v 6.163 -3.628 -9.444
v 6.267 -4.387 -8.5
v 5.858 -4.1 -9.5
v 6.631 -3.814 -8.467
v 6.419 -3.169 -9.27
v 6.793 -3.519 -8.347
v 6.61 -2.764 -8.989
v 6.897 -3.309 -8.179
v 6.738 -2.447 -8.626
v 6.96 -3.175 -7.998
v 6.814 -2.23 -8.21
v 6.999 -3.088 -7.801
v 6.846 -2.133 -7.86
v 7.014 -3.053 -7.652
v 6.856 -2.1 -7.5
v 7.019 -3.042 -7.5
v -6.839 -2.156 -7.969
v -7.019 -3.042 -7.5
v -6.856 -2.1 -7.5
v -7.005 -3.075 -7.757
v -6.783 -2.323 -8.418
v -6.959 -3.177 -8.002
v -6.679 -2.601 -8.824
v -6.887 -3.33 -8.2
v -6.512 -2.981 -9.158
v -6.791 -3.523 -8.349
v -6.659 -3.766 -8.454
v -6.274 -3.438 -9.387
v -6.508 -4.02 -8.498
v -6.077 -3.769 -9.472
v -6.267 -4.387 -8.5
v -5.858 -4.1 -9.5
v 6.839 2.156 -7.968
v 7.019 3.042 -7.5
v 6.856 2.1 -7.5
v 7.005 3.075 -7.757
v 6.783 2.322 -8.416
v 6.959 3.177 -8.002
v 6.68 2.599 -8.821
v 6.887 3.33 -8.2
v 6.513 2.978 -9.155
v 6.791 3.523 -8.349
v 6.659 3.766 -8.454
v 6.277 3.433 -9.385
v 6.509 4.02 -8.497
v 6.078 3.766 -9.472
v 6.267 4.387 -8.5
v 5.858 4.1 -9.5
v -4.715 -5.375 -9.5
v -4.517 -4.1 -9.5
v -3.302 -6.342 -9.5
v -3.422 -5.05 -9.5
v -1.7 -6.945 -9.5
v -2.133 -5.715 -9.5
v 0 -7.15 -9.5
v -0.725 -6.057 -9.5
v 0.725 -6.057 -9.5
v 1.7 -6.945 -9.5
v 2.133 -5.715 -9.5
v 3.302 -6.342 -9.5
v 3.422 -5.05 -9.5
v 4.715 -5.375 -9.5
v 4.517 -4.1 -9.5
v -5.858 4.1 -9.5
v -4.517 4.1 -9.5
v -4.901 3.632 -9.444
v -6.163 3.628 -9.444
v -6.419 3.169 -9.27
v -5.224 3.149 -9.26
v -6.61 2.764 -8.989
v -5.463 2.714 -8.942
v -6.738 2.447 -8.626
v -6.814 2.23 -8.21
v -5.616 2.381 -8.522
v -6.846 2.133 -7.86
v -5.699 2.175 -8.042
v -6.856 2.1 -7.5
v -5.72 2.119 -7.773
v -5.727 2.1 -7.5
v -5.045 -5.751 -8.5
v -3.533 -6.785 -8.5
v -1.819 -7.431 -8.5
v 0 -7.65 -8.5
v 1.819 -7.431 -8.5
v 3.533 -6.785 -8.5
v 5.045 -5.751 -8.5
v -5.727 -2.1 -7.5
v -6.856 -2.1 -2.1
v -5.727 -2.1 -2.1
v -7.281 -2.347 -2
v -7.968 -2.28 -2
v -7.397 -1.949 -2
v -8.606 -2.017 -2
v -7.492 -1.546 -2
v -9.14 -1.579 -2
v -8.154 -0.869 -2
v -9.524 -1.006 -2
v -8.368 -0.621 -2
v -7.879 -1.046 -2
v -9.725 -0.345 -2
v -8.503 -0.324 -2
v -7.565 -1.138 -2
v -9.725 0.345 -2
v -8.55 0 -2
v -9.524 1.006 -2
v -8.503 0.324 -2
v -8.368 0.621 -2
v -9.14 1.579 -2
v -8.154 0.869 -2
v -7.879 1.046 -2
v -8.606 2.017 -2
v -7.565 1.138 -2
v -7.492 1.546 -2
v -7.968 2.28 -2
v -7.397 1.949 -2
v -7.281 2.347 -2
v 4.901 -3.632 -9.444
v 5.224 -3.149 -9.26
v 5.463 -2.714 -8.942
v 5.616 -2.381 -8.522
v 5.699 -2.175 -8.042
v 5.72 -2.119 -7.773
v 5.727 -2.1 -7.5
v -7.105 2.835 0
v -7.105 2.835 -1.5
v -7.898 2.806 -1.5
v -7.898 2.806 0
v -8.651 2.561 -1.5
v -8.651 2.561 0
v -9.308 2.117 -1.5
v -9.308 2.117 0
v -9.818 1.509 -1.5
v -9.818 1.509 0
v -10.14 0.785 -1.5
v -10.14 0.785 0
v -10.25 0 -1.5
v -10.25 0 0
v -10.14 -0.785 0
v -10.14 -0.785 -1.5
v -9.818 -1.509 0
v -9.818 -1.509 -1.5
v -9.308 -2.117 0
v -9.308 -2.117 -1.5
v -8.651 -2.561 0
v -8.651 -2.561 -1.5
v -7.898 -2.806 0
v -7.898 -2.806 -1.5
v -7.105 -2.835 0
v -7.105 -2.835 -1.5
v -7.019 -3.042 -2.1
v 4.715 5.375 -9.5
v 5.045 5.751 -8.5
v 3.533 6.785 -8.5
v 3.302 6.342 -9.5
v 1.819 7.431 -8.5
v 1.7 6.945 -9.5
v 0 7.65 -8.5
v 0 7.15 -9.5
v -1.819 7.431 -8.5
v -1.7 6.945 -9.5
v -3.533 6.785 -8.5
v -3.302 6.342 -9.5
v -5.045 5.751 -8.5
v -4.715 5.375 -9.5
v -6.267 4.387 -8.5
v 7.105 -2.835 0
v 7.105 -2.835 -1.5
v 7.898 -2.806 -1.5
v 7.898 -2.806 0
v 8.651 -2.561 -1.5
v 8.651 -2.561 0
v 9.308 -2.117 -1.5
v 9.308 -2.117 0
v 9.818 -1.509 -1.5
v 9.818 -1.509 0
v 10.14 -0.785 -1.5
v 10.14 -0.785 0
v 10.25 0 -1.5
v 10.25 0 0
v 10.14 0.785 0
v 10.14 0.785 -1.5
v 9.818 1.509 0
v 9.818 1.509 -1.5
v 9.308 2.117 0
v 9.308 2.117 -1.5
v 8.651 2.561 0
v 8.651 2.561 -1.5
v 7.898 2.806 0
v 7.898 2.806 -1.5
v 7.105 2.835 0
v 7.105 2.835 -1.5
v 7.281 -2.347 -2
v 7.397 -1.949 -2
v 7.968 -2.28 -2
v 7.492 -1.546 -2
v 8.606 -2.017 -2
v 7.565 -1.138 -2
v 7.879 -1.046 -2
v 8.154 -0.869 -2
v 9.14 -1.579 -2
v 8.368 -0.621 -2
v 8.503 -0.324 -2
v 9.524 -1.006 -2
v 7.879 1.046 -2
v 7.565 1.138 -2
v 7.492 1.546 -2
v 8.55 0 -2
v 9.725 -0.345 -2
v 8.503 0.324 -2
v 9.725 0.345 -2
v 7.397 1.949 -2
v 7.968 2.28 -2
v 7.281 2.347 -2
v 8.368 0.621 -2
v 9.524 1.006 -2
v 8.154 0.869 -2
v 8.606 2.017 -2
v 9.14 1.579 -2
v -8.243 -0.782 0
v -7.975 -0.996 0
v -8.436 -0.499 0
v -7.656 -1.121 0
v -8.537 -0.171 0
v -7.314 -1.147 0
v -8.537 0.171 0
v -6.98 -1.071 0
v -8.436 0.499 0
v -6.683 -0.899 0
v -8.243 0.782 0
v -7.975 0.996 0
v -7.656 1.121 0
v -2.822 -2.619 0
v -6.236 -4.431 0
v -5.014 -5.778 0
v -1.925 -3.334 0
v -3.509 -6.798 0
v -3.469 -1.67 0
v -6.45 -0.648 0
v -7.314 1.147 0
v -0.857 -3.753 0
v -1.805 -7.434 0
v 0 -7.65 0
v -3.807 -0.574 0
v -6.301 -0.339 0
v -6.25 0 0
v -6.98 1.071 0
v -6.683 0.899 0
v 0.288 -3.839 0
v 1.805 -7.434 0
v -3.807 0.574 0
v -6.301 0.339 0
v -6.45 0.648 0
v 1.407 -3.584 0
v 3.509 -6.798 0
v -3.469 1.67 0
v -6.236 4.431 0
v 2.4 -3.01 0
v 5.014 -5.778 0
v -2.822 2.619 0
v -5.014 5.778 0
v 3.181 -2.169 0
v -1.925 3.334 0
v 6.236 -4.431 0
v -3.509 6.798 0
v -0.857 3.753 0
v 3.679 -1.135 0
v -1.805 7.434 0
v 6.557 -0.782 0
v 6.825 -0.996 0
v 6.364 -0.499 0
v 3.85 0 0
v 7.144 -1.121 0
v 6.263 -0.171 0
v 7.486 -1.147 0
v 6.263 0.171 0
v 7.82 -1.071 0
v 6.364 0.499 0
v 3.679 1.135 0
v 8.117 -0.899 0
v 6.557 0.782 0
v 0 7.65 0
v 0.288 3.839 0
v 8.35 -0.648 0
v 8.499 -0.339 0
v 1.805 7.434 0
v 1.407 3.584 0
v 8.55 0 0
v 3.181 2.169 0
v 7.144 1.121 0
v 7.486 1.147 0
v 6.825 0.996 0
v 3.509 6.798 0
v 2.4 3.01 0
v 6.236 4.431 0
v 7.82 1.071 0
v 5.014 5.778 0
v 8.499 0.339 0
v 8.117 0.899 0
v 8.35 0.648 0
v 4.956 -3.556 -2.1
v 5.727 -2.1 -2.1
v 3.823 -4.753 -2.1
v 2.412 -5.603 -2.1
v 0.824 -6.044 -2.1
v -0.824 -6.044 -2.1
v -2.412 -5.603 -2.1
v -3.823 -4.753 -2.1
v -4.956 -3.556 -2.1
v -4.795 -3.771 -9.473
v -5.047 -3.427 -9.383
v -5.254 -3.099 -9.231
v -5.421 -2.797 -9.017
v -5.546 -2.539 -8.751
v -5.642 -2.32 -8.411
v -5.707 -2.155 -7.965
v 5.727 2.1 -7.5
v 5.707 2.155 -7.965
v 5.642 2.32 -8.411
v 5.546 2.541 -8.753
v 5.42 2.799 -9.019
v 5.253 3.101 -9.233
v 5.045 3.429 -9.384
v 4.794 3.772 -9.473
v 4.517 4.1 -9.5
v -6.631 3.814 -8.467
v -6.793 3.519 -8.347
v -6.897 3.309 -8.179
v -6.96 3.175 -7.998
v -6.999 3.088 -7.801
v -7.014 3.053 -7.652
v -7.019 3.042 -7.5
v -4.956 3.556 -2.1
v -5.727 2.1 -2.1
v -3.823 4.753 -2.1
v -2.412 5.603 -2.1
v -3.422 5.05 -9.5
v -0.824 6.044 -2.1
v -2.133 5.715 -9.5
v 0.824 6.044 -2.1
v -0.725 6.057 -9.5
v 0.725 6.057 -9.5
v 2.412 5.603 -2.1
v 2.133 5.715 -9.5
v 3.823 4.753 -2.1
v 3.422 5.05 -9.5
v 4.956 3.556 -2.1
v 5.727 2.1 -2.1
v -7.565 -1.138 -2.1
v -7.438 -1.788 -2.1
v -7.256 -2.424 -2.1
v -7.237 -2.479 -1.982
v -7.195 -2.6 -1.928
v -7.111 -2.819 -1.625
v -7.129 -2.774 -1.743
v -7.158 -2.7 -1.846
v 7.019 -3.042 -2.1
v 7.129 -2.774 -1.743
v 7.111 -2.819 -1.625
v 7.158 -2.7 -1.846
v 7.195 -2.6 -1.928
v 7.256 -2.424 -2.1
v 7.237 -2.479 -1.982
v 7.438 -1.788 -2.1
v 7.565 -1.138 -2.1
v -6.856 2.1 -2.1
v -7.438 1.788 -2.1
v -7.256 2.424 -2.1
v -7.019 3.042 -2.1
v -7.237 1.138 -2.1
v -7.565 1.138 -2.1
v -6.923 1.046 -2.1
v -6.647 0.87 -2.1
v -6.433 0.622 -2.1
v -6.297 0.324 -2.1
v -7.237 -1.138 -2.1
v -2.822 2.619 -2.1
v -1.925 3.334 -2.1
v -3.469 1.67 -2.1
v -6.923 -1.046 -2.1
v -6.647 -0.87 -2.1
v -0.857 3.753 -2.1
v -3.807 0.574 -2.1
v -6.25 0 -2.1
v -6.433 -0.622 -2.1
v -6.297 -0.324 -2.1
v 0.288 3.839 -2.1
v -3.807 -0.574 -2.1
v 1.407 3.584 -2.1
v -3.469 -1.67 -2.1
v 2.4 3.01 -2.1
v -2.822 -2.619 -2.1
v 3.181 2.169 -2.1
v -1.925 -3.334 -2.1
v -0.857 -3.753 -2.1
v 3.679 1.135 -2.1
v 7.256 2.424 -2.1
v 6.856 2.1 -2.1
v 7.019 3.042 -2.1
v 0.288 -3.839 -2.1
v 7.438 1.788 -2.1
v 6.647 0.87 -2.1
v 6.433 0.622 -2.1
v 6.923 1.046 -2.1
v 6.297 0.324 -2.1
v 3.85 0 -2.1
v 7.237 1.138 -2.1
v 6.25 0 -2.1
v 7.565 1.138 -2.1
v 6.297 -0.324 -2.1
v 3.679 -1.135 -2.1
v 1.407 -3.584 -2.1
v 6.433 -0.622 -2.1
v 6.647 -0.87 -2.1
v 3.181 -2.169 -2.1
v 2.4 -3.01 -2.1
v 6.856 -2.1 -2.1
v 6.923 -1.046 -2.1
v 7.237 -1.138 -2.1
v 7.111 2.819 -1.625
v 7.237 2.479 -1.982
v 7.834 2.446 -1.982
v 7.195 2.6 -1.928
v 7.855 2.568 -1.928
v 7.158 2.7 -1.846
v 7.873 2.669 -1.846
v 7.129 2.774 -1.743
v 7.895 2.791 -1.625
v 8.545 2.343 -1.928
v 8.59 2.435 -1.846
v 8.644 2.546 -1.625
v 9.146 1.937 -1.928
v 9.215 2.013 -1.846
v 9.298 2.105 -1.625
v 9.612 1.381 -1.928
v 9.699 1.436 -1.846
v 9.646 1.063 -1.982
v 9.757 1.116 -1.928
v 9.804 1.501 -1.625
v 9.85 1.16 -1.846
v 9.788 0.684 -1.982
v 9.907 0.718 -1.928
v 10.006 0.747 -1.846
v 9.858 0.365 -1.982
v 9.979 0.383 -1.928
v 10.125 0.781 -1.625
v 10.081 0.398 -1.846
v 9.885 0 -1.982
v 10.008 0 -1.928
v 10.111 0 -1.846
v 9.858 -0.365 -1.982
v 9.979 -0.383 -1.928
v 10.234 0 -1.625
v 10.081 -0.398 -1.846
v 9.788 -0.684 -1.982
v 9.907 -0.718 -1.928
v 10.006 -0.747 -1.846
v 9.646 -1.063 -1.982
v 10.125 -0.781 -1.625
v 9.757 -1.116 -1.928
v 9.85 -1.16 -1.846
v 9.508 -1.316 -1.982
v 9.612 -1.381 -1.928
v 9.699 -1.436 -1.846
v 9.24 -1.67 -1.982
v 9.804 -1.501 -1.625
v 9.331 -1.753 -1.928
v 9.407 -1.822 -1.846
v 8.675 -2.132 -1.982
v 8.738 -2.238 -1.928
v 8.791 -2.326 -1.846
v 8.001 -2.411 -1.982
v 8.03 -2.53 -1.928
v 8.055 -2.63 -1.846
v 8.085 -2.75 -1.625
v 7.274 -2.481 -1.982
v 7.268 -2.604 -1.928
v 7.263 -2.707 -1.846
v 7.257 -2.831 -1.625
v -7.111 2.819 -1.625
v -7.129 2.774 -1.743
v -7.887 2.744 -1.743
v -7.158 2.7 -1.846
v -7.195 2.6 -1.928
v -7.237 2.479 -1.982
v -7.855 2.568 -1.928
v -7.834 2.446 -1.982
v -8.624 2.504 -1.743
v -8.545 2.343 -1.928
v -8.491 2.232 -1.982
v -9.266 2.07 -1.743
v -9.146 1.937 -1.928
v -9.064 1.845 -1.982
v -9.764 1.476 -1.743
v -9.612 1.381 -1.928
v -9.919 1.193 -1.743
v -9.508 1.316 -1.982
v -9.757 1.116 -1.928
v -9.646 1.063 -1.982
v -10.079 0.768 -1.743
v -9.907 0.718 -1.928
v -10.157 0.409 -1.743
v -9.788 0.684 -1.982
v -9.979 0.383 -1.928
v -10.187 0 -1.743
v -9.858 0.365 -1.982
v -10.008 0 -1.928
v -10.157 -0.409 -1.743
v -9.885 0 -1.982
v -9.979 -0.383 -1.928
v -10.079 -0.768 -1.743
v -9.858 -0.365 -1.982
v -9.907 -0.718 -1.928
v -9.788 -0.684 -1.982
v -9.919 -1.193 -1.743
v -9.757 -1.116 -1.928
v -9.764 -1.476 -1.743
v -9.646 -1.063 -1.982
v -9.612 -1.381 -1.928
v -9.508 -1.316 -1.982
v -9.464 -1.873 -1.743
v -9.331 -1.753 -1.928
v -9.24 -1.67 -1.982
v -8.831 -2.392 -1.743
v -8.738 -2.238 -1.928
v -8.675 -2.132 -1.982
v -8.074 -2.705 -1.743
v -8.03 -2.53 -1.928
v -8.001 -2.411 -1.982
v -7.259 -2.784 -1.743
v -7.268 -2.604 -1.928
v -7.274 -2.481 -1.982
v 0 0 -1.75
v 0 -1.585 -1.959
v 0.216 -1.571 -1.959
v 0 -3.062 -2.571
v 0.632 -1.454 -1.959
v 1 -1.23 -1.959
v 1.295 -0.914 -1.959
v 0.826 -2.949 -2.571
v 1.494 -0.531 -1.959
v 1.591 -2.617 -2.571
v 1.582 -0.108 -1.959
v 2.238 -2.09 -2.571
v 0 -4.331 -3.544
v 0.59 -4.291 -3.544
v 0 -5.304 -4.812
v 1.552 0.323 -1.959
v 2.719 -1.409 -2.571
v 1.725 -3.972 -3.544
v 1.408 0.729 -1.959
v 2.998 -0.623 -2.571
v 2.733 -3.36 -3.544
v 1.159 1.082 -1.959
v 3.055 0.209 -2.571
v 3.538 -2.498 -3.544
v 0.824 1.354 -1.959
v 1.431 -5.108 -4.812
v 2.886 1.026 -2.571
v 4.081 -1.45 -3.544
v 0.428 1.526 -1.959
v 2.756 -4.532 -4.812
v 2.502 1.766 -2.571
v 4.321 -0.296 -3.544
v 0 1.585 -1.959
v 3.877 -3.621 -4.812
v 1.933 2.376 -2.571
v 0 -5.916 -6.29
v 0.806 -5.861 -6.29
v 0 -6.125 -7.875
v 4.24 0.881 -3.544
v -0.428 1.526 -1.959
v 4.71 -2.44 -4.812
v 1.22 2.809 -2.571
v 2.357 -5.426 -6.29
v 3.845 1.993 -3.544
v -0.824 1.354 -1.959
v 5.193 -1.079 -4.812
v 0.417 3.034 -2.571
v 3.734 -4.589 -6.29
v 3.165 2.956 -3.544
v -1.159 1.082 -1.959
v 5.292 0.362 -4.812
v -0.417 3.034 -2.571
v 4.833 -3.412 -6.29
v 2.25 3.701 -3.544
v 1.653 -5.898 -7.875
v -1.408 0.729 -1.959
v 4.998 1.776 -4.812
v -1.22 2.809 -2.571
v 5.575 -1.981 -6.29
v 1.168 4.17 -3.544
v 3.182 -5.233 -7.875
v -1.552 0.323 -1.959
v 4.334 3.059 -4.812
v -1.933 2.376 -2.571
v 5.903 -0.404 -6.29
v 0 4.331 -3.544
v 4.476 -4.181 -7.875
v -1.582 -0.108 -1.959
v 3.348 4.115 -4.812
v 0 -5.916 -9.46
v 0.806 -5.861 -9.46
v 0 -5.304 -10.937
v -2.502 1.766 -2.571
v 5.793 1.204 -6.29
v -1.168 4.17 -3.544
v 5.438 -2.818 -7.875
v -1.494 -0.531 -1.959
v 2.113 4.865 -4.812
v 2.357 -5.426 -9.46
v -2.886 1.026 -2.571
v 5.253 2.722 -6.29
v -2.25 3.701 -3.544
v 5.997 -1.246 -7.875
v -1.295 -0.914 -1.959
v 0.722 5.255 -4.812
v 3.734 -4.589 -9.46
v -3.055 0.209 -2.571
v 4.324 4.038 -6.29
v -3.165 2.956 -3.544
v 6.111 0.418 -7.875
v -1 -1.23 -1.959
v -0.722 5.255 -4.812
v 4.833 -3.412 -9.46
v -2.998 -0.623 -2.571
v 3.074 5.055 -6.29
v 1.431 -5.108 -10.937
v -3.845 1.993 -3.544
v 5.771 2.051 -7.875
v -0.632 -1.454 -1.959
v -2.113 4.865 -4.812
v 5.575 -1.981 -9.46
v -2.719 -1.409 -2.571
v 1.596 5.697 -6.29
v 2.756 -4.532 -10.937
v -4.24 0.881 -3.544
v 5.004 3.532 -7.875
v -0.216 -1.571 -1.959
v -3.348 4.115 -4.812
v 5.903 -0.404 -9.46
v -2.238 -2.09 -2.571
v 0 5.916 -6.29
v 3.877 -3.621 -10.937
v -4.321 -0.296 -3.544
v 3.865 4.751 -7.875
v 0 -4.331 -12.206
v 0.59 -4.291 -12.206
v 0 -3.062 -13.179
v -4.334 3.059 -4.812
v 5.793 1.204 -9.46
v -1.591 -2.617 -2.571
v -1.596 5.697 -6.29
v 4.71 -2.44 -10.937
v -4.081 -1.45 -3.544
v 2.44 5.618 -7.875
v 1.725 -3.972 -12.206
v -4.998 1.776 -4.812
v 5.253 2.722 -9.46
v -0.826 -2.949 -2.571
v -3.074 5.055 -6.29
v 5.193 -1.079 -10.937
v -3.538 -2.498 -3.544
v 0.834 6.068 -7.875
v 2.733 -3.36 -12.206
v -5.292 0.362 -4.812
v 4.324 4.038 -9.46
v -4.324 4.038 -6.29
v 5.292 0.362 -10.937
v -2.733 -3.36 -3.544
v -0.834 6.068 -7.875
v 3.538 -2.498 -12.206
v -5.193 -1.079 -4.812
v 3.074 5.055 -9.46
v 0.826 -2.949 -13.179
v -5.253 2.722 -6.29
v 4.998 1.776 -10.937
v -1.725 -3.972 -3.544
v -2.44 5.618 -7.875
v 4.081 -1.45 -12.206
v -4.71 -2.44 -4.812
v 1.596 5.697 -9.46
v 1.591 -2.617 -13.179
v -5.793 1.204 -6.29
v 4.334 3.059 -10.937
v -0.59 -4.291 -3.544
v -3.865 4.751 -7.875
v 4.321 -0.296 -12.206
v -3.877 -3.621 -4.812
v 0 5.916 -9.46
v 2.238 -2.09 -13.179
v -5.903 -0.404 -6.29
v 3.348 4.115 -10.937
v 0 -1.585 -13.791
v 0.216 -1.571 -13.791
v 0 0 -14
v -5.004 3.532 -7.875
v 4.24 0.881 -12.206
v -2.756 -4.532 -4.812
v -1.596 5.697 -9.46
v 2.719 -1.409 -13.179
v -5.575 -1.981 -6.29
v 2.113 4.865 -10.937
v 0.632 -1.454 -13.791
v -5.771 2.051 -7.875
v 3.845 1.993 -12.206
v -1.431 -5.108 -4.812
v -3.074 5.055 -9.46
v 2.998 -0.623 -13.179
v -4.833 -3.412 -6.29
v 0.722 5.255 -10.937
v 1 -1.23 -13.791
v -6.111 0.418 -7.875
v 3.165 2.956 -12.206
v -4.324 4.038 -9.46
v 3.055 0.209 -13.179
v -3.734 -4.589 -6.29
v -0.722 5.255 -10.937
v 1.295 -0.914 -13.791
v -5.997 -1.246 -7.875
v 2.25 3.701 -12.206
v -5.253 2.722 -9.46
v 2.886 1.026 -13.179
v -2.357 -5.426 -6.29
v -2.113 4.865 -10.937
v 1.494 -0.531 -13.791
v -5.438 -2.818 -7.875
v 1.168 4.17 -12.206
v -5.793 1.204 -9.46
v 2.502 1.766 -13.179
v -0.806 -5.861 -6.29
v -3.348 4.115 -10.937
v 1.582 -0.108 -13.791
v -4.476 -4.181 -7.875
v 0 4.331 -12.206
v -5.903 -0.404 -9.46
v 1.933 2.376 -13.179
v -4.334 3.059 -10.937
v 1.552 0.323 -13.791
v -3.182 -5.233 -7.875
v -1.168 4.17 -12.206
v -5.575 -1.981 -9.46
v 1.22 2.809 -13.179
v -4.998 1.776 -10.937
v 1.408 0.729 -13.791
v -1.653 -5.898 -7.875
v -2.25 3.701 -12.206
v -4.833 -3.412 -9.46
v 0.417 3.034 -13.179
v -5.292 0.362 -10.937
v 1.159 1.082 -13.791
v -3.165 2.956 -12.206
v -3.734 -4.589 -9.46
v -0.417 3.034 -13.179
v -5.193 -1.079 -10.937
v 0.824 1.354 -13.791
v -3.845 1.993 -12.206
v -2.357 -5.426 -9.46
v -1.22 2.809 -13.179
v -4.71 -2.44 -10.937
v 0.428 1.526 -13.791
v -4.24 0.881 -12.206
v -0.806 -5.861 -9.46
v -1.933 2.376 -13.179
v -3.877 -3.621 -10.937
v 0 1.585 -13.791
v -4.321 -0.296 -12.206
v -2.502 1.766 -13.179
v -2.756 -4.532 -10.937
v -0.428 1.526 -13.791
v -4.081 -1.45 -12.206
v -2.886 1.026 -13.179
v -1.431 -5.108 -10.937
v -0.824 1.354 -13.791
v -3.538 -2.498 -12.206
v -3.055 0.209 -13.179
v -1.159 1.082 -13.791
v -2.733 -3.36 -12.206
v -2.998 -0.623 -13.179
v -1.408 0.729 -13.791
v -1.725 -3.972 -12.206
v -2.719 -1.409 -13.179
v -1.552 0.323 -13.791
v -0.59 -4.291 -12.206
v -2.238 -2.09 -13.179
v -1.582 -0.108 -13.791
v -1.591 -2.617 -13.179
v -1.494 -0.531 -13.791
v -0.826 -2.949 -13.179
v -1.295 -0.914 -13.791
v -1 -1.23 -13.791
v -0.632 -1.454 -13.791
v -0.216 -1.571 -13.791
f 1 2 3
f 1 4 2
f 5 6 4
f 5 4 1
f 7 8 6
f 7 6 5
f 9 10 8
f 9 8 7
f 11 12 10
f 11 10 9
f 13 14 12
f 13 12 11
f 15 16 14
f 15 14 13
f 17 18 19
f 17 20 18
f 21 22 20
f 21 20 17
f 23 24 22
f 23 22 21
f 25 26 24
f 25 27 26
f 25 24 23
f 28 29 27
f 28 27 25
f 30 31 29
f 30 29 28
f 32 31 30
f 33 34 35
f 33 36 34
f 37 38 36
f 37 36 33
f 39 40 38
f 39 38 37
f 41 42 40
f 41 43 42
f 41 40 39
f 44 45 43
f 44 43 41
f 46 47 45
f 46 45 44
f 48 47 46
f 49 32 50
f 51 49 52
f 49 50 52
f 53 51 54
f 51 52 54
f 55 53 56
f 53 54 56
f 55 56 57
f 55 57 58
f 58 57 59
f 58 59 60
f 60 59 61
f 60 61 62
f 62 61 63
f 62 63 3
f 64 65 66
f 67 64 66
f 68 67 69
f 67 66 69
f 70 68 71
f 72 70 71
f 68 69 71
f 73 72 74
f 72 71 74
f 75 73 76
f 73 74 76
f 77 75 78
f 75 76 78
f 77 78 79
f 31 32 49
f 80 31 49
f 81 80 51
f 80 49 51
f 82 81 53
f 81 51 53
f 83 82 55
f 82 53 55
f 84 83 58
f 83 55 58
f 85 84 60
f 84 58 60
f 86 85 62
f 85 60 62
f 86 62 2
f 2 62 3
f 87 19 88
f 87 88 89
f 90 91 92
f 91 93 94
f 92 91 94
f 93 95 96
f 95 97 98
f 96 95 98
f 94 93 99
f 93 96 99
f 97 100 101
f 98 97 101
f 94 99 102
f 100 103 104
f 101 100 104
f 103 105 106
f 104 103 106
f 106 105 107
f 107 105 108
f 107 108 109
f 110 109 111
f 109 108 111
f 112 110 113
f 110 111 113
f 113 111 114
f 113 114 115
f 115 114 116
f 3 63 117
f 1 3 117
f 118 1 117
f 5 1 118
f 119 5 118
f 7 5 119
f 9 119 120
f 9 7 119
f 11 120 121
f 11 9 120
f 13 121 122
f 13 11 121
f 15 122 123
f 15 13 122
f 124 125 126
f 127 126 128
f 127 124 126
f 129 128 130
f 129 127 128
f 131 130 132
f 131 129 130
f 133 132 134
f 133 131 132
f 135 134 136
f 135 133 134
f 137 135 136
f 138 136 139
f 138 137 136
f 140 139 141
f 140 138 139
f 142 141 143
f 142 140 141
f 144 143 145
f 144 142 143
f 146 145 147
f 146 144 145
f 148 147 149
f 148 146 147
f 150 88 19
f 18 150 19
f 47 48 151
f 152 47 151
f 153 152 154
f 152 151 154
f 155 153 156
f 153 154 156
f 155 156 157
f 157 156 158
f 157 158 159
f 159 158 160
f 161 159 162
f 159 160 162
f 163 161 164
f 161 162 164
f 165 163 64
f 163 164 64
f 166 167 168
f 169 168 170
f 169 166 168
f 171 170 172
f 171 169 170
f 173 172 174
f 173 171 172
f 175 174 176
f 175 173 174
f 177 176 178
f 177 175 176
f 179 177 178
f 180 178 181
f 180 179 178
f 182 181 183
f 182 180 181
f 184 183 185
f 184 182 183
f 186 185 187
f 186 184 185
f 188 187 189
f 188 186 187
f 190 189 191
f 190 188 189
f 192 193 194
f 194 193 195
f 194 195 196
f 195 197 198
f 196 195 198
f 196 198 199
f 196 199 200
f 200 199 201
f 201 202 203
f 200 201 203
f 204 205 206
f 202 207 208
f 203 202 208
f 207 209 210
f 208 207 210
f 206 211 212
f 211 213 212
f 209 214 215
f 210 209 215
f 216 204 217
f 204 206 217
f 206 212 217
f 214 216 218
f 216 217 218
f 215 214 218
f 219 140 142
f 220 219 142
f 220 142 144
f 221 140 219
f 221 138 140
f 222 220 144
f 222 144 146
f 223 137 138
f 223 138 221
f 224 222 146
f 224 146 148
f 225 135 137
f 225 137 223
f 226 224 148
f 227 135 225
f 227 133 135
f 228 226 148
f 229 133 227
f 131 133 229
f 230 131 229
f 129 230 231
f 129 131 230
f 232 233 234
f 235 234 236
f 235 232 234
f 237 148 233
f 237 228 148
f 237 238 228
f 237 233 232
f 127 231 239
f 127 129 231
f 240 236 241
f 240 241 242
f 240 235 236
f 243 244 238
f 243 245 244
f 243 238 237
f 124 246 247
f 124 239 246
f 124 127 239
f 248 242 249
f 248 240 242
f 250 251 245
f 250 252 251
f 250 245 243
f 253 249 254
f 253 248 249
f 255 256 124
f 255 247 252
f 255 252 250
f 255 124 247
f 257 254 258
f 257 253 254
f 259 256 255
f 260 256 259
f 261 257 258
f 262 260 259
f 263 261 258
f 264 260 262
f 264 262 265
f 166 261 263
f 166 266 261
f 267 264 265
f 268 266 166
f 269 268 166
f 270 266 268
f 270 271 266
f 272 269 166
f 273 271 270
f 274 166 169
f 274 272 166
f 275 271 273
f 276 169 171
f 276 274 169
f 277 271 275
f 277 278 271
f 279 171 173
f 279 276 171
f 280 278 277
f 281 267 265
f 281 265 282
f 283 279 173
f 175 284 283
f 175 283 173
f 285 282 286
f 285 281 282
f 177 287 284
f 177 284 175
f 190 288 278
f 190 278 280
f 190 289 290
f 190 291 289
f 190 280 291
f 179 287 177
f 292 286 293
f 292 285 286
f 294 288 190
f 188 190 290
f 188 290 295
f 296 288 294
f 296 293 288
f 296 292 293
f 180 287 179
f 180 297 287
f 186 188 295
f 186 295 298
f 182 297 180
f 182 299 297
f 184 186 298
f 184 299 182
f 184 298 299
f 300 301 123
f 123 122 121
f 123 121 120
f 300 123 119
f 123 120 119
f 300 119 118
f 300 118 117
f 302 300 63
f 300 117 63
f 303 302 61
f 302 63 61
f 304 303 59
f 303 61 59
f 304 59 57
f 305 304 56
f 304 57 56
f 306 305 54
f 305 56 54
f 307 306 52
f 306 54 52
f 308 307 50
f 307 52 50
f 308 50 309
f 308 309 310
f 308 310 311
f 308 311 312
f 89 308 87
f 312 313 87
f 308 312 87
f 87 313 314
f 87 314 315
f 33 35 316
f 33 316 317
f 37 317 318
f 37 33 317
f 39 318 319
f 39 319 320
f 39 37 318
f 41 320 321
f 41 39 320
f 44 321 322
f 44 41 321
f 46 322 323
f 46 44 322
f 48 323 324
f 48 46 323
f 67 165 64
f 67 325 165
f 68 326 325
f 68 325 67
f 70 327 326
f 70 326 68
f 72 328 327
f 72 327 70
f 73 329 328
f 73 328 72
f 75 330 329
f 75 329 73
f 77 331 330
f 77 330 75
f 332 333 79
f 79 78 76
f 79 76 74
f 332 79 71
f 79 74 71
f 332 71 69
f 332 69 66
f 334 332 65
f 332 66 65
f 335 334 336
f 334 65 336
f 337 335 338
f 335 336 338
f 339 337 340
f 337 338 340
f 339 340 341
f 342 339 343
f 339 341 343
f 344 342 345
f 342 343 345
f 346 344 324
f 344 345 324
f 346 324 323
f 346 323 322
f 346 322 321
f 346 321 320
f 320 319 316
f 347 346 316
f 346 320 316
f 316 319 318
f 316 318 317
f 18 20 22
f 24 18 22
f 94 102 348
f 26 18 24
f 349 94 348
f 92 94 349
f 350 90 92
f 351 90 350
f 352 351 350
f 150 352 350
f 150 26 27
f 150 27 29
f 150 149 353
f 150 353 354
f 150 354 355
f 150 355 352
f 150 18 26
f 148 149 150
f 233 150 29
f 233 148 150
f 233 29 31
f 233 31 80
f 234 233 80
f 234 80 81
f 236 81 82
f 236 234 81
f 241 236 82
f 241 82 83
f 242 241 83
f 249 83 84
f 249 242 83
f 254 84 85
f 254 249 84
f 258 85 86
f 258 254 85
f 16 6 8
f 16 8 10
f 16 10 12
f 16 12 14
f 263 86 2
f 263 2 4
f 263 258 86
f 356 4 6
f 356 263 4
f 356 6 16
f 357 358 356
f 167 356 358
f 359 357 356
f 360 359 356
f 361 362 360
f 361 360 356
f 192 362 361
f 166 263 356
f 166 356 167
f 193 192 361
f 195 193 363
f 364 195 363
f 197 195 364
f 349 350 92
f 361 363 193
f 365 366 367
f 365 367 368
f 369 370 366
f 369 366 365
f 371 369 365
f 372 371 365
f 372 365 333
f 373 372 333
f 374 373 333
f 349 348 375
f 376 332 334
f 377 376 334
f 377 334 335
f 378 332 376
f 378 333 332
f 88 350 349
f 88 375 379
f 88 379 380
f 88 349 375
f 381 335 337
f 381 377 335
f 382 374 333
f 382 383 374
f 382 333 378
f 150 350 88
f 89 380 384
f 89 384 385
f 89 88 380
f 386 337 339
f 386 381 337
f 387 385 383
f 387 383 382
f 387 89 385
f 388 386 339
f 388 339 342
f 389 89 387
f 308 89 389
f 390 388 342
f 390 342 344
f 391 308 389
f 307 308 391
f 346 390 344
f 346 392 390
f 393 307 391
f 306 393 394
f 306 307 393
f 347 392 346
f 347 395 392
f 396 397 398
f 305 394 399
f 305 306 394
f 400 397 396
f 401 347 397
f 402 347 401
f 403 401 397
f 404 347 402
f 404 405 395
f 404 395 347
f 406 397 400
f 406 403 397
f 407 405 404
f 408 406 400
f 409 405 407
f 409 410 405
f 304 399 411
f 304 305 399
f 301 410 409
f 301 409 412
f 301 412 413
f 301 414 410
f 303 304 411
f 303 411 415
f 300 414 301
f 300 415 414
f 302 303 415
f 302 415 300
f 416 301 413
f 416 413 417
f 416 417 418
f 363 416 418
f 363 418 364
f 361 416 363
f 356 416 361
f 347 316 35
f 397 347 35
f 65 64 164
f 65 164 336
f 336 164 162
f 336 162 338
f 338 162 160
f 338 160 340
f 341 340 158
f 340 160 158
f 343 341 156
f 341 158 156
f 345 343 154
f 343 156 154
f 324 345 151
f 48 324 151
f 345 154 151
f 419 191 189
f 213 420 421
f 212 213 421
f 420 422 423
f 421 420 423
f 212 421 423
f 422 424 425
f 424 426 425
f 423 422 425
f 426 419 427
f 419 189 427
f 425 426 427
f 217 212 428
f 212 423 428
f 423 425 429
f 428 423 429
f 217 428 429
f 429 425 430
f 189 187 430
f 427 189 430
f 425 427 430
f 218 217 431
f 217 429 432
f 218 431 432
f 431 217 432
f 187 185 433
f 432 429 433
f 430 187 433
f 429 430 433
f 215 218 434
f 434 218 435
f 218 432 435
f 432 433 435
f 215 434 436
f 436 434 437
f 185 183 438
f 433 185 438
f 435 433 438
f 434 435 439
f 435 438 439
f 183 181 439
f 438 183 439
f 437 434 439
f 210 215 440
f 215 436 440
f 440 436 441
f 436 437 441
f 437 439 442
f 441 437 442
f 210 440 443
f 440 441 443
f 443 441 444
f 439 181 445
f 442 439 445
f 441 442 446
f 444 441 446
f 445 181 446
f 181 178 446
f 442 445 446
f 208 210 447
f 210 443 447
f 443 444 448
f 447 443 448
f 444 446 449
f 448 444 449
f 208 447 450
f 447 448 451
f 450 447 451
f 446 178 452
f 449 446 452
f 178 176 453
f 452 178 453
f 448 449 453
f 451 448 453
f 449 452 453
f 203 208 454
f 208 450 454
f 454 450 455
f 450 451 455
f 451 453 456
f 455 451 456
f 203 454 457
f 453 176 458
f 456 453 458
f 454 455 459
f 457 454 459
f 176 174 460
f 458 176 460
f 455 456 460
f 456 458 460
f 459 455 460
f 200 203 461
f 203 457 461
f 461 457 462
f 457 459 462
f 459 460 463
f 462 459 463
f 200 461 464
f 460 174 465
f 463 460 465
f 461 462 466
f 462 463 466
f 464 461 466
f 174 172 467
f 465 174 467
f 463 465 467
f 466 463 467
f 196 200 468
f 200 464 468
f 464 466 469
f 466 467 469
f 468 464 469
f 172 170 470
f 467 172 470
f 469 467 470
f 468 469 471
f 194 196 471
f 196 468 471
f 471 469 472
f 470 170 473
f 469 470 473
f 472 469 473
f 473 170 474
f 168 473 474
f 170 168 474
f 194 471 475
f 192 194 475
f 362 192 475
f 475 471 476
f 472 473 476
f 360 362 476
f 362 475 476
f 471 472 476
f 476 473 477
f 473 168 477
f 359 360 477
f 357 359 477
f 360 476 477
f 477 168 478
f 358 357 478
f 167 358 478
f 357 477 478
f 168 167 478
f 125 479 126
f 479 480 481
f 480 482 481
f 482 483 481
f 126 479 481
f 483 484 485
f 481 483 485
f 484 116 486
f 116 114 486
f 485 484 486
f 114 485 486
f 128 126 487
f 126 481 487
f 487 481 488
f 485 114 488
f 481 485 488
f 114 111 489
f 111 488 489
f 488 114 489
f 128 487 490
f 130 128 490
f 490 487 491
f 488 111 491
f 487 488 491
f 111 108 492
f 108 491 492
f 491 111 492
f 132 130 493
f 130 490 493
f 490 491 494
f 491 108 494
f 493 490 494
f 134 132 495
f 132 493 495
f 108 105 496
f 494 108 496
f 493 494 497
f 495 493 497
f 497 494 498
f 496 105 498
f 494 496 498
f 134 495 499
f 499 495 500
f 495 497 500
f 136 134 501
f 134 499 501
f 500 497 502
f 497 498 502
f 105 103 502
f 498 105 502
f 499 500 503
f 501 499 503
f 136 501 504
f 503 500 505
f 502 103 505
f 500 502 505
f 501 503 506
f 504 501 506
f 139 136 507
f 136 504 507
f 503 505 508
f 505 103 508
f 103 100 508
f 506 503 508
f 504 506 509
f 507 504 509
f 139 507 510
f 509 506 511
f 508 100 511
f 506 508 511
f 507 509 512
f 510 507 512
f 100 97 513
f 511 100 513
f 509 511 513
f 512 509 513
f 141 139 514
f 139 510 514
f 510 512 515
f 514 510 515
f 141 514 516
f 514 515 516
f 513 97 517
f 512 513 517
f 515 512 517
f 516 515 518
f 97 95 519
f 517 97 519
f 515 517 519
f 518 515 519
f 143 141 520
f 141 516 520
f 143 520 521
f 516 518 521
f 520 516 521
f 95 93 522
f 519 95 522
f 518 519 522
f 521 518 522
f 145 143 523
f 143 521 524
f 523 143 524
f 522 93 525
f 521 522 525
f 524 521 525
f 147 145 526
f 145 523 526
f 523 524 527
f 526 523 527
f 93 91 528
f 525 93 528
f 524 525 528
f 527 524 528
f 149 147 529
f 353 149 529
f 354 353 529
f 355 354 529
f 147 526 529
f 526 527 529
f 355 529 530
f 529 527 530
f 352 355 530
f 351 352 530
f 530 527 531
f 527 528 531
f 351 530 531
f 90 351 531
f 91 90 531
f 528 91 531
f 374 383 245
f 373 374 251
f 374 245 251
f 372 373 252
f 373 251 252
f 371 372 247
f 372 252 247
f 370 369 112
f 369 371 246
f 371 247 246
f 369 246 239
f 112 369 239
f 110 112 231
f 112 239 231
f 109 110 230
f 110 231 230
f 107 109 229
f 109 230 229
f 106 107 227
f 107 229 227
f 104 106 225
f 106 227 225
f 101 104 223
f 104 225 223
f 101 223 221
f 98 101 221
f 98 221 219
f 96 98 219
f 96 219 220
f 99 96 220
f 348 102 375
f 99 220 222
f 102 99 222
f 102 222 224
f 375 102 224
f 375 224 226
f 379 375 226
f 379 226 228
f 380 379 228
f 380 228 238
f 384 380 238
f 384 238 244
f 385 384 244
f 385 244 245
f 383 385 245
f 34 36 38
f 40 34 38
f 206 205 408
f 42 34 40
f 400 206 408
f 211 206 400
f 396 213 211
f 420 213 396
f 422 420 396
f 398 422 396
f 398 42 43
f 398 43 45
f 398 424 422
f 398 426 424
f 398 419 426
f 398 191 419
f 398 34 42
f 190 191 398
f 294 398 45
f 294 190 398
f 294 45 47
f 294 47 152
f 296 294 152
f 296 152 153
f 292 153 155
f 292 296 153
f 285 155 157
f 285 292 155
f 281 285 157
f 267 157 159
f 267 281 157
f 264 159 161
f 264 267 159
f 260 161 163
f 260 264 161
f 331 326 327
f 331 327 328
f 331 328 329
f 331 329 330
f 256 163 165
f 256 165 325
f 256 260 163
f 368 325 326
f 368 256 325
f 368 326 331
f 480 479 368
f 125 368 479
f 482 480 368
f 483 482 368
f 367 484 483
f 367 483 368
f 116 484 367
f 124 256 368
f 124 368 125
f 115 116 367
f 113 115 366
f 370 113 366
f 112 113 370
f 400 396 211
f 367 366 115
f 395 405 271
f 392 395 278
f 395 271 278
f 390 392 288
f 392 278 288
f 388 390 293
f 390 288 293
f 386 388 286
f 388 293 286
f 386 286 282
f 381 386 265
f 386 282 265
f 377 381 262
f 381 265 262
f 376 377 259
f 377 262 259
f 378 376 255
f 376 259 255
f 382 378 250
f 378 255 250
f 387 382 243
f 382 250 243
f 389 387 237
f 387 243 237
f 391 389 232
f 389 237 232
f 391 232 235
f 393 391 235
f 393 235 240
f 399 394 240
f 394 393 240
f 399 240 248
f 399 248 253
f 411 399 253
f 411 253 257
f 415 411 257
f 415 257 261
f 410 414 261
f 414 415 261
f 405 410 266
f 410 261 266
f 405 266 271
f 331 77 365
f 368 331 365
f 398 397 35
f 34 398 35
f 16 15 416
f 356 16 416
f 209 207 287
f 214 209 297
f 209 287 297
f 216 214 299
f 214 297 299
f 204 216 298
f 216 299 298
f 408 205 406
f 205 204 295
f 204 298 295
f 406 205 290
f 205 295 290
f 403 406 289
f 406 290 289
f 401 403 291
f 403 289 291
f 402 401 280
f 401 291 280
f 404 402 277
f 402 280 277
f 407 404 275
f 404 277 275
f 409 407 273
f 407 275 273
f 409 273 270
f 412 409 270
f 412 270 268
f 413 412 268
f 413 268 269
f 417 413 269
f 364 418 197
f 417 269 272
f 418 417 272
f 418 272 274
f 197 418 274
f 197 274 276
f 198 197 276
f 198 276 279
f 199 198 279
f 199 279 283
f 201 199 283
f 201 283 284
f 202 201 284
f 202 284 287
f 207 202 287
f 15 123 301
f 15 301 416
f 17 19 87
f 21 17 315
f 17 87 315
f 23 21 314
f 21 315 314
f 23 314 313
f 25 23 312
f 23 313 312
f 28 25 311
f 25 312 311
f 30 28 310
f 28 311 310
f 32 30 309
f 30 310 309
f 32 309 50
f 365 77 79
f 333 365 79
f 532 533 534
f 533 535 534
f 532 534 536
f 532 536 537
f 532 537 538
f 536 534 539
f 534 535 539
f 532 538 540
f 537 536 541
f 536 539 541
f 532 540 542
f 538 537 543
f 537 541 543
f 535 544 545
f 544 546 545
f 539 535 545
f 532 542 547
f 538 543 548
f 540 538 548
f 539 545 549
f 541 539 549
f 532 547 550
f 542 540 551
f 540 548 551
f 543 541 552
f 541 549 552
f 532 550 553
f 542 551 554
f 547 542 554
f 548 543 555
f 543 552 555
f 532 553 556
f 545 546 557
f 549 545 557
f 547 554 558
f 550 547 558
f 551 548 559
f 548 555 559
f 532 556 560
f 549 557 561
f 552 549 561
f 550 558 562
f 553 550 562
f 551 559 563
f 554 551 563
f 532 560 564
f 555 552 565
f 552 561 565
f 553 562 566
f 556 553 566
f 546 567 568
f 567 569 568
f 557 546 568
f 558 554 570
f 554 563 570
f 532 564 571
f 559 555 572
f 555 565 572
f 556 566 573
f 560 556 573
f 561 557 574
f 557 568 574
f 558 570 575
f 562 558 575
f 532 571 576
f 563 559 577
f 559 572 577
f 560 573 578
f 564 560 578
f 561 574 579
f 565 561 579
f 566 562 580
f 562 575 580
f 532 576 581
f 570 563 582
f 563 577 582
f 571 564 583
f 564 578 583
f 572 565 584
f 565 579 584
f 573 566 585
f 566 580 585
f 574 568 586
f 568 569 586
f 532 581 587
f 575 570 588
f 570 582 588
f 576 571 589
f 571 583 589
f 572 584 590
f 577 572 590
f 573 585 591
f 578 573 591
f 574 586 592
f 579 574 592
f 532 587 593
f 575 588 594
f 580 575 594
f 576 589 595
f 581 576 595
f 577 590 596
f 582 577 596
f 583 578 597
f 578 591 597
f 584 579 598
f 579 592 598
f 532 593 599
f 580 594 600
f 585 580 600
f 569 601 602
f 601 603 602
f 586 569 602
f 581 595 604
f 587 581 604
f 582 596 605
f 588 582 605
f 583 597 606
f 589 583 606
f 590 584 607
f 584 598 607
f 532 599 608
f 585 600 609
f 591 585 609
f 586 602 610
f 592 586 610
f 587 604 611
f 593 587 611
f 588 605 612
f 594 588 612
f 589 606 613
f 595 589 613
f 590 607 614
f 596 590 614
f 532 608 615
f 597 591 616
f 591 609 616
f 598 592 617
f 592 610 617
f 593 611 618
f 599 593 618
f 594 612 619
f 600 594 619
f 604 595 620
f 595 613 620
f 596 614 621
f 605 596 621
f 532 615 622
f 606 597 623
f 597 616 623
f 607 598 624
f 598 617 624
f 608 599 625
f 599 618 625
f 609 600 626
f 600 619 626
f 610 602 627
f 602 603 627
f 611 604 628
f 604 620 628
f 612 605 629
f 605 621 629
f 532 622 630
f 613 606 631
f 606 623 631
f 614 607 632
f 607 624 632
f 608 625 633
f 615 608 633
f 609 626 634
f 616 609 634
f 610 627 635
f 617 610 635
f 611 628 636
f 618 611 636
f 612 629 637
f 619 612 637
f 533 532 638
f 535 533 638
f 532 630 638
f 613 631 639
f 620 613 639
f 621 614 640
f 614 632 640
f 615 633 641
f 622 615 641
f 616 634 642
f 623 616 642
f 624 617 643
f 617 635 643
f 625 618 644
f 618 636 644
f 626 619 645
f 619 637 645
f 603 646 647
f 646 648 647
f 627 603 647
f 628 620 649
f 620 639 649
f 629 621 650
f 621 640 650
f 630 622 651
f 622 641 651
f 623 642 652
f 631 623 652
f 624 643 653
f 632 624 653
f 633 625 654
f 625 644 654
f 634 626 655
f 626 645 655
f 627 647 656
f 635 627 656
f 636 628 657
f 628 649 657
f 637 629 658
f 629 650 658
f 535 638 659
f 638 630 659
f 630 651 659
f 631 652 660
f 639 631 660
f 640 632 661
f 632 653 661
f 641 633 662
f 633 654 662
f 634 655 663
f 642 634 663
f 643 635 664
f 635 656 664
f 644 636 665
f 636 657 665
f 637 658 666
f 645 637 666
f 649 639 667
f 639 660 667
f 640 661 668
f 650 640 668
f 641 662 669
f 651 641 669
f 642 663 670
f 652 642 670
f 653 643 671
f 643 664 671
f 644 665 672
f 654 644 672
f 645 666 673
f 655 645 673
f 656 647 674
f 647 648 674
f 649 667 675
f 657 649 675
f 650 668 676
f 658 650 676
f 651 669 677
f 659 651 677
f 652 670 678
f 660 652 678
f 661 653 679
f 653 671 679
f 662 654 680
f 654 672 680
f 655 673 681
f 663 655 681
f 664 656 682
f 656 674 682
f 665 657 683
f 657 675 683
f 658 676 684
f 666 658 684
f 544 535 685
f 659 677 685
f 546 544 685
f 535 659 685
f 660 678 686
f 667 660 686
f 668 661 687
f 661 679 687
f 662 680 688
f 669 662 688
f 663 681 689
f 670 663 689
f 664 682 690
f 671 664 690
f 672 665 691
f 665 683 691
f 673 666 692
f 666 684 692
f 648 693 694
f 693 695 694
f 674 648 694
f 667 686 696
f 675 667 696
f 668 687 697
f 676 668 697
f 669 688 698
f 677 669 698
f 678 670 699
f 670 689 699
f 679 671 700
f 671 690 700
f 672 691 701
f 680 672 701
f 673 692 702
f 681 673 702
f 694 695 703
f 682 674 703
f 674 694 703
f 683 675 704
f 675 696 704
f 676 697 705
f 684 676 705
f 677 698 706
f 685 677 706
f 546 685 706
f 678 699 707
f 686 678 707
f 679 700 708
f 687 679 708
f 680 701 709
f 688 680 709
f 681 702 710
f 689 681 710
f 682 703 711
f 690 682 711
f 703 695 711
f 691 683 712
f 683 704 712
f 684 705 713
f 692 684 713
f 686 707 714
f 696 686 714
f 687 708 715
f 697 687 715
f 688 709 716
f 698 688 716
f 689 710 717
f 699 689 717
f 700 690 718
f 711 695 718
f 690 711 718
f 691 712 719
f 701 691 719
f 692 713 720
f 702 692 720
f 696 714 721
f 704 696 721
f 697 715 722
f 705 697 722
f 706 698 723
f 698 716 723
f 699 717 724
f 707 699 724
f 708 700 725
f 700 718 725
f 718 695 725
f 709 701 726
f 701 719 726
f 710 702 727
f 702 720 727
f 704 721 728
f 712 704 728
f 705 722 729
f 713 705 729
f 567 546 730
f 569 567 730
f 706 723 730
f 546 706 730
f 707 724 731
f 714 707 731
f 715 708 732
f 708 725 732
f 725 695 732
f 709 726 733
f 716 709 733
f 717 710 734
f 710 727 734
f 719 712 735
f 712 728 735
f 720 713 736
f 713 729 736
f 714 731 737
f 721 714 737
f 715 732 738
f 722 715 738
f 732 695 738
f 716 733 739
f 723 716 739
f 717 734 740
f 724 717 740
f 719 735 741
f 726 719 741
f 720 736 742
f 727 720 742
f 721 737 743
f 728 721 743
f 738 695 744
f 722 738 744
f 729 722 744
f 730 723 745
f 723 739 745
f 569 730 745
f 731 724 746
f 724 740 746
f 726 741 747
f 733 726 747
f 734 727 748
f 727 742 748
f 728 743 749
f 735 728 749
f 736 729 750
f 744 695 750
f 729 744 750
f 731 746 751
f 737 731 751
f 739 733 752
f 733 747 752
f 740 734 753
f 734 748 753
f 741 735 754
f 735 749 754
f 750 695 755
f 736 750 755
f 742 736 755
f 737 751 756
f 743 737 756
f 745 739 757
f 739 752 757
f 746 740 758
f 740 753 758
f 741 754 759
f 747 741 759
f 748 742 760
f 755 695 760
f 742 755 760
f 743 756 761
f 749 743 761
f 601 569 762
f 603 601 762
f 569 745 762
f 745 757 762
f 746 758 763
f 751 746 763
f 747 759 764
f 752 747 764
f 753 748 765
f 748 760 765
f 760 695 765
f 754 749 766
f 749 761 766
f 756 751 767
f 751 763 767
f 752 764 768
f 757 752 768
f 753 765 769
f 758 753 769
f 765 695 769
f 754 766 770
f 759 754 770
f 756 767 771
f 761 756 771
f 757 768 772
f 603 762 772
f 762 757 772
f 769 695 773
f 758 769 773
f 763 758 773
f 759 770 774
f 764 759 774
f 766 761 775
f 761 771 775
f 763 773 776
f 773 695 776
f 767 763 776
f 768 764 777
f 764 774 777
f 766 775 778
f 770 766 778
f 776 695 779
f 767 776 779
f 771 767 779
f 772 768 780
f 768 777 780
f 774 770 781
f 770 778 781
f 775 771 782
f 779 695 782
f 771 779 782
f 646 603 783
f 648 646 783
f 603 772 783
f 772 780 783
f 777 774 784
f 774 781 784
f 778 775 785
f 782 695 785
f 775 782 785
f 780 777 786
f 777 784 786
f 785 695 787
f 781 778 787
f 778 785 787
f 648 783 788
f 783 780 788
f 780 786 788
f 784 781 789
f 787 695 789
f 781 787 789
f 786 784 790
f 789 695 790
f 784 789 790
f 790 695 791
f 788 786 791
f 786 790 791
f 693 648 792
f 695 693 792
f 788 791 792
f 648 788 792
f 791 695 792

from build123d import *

# Parameters (mm, degrees)
SKETCH_R        = 7.65
PAD_DEPTH       = 9.5
SKETCH001_R     = 6.1
POCKET_DEPTH    = 7.4
SKETCH002_R     = 3.85
POCKET001_DEPTH = 5
SKETCH003_R     = 2.85
PAD001_DEPTH    = 2
SKETCH004_W     = 25
SKETCH004_H     = 4.2
POCKET002_DEPTH = 7.4
FILLET_R        = 2
CHAMFER_SIZE2   = 0.5
CHAMFER_SIZE    = 1
SKETCH005_R     = 1.15
POCKET003_DEPTH = 5
FILLET001_R     = 0.5


with BuildPart() as shell:
    # Sketch → Pad (new body)
    with BuildSketch(Plane.XY):
        Circle(SKETCH_R)
    extrude(amount=-PAD_DEPTH)

    # Sketch001 (on Face3 of Pad) → Pocket (cut)
    with BuildSketch(Plane(origin=(0, 0, -9.5), x_dir=(1, 0, 0), z_dir=(0, 0, -1))):
        Circle(SKETCH001_R)
    extrude(amount=-POCKET_DEPTH, mode=Mode.SUBTRACT)

    # Sketch002 (on Face2 of Pocket) → Pocket001 (cut)
    with BuildSketch(Plane.XY):
        Circle(SKETCH002_R)
    extrude(amount=-POCKET001_DEPTH, mode=Mode.SUBTRACT)

    # Sketch003 → Pad001 (join)
    with BuildSketch(Plane.XY):
        with Locations((-7.4, 0)):
            Circle(SKETCH003_R)
        with Locations((7.4, 0)):
            Circle(SKETCH003_R)
    extrude(amount=-PAD001_DEPTH)

    # Sketch004 (on Face12 of Pad001) → Pocket002 (cut)
    with BuildSketch(Plane(origin=(0, 0, -9.5), x_dir=(1, 0, 0), z_dir=(0, 0, -1))):
        Rectangle(SKETCH004_W, SKETCH004_H)
    extrude(amount=-POCKET002_DEPTH, mode=Mode.SUBTRACT)

    # Fillet
    fillet_edges = [shell.edges().sort_by_distance(p)[0] for p in [
        (-6.541624, 2.1, -9.5),
        (-6.541624, -2.1, -9.5),
        (6.541624, 2.1, -9.5),
        (6.541624, -2.1, -9.5),
    ]]
    fillet(fillet_edges, radius=FILLET_R)

    # Chamfer
    chamfer_edges = [shell.edges().sort_by_distance(p)[0] for p in [
        (0, -7.65, -9.5),
        (0, 7.65, -9.5),
    ]]
    chamfer_side = shell.faces().sort_by_distance((7.576174, -1.060232, -2.076369))[0]
    chamfer(chamfer_edges, length=CHAMFER_SIZE, length2=CHAMFER_SIZE2, reference=chamfer_side)

    # Sketch005 (on Face16 of Chamfer) → Pocket003 (cut)
    with BuildSketch(Plane.XY):
        with Locations((-7.4, 0)):
            Circle(SKETCH005_R)
        with Locations((7.4, 0)):
            Circle(SKETCH005_R)
    extrude(amount=-POCKET003_DEPTH, mode=Mode.SUBTRACT)

    # Fillet001
    fillet001_edges = [shell.edges().sort_by_distance(p)[0] for p in [
        (-10.25, 0, -2),
        (9.308259, 2.116848, -2),
        (9.308259, -2.116848, -2),
    ]]
    fillet(fillet001_edges, radius=FILLET001_R)


with BuildPart() as ball:
    # Sketch006 → Revolution (revolve)
    with BuildSketch(Plane.YZ):
        with BuildLine():
            ThreePointArc((0, -1.75), (-6.125, -7.875), (0, -14))
            Line((0, -1.75), (0, -14))
        make_face()
    revolve(axis=Axis((0, 0, 0), (0, 0, 1)))


solid = Compound([shell.part, ball.part])
